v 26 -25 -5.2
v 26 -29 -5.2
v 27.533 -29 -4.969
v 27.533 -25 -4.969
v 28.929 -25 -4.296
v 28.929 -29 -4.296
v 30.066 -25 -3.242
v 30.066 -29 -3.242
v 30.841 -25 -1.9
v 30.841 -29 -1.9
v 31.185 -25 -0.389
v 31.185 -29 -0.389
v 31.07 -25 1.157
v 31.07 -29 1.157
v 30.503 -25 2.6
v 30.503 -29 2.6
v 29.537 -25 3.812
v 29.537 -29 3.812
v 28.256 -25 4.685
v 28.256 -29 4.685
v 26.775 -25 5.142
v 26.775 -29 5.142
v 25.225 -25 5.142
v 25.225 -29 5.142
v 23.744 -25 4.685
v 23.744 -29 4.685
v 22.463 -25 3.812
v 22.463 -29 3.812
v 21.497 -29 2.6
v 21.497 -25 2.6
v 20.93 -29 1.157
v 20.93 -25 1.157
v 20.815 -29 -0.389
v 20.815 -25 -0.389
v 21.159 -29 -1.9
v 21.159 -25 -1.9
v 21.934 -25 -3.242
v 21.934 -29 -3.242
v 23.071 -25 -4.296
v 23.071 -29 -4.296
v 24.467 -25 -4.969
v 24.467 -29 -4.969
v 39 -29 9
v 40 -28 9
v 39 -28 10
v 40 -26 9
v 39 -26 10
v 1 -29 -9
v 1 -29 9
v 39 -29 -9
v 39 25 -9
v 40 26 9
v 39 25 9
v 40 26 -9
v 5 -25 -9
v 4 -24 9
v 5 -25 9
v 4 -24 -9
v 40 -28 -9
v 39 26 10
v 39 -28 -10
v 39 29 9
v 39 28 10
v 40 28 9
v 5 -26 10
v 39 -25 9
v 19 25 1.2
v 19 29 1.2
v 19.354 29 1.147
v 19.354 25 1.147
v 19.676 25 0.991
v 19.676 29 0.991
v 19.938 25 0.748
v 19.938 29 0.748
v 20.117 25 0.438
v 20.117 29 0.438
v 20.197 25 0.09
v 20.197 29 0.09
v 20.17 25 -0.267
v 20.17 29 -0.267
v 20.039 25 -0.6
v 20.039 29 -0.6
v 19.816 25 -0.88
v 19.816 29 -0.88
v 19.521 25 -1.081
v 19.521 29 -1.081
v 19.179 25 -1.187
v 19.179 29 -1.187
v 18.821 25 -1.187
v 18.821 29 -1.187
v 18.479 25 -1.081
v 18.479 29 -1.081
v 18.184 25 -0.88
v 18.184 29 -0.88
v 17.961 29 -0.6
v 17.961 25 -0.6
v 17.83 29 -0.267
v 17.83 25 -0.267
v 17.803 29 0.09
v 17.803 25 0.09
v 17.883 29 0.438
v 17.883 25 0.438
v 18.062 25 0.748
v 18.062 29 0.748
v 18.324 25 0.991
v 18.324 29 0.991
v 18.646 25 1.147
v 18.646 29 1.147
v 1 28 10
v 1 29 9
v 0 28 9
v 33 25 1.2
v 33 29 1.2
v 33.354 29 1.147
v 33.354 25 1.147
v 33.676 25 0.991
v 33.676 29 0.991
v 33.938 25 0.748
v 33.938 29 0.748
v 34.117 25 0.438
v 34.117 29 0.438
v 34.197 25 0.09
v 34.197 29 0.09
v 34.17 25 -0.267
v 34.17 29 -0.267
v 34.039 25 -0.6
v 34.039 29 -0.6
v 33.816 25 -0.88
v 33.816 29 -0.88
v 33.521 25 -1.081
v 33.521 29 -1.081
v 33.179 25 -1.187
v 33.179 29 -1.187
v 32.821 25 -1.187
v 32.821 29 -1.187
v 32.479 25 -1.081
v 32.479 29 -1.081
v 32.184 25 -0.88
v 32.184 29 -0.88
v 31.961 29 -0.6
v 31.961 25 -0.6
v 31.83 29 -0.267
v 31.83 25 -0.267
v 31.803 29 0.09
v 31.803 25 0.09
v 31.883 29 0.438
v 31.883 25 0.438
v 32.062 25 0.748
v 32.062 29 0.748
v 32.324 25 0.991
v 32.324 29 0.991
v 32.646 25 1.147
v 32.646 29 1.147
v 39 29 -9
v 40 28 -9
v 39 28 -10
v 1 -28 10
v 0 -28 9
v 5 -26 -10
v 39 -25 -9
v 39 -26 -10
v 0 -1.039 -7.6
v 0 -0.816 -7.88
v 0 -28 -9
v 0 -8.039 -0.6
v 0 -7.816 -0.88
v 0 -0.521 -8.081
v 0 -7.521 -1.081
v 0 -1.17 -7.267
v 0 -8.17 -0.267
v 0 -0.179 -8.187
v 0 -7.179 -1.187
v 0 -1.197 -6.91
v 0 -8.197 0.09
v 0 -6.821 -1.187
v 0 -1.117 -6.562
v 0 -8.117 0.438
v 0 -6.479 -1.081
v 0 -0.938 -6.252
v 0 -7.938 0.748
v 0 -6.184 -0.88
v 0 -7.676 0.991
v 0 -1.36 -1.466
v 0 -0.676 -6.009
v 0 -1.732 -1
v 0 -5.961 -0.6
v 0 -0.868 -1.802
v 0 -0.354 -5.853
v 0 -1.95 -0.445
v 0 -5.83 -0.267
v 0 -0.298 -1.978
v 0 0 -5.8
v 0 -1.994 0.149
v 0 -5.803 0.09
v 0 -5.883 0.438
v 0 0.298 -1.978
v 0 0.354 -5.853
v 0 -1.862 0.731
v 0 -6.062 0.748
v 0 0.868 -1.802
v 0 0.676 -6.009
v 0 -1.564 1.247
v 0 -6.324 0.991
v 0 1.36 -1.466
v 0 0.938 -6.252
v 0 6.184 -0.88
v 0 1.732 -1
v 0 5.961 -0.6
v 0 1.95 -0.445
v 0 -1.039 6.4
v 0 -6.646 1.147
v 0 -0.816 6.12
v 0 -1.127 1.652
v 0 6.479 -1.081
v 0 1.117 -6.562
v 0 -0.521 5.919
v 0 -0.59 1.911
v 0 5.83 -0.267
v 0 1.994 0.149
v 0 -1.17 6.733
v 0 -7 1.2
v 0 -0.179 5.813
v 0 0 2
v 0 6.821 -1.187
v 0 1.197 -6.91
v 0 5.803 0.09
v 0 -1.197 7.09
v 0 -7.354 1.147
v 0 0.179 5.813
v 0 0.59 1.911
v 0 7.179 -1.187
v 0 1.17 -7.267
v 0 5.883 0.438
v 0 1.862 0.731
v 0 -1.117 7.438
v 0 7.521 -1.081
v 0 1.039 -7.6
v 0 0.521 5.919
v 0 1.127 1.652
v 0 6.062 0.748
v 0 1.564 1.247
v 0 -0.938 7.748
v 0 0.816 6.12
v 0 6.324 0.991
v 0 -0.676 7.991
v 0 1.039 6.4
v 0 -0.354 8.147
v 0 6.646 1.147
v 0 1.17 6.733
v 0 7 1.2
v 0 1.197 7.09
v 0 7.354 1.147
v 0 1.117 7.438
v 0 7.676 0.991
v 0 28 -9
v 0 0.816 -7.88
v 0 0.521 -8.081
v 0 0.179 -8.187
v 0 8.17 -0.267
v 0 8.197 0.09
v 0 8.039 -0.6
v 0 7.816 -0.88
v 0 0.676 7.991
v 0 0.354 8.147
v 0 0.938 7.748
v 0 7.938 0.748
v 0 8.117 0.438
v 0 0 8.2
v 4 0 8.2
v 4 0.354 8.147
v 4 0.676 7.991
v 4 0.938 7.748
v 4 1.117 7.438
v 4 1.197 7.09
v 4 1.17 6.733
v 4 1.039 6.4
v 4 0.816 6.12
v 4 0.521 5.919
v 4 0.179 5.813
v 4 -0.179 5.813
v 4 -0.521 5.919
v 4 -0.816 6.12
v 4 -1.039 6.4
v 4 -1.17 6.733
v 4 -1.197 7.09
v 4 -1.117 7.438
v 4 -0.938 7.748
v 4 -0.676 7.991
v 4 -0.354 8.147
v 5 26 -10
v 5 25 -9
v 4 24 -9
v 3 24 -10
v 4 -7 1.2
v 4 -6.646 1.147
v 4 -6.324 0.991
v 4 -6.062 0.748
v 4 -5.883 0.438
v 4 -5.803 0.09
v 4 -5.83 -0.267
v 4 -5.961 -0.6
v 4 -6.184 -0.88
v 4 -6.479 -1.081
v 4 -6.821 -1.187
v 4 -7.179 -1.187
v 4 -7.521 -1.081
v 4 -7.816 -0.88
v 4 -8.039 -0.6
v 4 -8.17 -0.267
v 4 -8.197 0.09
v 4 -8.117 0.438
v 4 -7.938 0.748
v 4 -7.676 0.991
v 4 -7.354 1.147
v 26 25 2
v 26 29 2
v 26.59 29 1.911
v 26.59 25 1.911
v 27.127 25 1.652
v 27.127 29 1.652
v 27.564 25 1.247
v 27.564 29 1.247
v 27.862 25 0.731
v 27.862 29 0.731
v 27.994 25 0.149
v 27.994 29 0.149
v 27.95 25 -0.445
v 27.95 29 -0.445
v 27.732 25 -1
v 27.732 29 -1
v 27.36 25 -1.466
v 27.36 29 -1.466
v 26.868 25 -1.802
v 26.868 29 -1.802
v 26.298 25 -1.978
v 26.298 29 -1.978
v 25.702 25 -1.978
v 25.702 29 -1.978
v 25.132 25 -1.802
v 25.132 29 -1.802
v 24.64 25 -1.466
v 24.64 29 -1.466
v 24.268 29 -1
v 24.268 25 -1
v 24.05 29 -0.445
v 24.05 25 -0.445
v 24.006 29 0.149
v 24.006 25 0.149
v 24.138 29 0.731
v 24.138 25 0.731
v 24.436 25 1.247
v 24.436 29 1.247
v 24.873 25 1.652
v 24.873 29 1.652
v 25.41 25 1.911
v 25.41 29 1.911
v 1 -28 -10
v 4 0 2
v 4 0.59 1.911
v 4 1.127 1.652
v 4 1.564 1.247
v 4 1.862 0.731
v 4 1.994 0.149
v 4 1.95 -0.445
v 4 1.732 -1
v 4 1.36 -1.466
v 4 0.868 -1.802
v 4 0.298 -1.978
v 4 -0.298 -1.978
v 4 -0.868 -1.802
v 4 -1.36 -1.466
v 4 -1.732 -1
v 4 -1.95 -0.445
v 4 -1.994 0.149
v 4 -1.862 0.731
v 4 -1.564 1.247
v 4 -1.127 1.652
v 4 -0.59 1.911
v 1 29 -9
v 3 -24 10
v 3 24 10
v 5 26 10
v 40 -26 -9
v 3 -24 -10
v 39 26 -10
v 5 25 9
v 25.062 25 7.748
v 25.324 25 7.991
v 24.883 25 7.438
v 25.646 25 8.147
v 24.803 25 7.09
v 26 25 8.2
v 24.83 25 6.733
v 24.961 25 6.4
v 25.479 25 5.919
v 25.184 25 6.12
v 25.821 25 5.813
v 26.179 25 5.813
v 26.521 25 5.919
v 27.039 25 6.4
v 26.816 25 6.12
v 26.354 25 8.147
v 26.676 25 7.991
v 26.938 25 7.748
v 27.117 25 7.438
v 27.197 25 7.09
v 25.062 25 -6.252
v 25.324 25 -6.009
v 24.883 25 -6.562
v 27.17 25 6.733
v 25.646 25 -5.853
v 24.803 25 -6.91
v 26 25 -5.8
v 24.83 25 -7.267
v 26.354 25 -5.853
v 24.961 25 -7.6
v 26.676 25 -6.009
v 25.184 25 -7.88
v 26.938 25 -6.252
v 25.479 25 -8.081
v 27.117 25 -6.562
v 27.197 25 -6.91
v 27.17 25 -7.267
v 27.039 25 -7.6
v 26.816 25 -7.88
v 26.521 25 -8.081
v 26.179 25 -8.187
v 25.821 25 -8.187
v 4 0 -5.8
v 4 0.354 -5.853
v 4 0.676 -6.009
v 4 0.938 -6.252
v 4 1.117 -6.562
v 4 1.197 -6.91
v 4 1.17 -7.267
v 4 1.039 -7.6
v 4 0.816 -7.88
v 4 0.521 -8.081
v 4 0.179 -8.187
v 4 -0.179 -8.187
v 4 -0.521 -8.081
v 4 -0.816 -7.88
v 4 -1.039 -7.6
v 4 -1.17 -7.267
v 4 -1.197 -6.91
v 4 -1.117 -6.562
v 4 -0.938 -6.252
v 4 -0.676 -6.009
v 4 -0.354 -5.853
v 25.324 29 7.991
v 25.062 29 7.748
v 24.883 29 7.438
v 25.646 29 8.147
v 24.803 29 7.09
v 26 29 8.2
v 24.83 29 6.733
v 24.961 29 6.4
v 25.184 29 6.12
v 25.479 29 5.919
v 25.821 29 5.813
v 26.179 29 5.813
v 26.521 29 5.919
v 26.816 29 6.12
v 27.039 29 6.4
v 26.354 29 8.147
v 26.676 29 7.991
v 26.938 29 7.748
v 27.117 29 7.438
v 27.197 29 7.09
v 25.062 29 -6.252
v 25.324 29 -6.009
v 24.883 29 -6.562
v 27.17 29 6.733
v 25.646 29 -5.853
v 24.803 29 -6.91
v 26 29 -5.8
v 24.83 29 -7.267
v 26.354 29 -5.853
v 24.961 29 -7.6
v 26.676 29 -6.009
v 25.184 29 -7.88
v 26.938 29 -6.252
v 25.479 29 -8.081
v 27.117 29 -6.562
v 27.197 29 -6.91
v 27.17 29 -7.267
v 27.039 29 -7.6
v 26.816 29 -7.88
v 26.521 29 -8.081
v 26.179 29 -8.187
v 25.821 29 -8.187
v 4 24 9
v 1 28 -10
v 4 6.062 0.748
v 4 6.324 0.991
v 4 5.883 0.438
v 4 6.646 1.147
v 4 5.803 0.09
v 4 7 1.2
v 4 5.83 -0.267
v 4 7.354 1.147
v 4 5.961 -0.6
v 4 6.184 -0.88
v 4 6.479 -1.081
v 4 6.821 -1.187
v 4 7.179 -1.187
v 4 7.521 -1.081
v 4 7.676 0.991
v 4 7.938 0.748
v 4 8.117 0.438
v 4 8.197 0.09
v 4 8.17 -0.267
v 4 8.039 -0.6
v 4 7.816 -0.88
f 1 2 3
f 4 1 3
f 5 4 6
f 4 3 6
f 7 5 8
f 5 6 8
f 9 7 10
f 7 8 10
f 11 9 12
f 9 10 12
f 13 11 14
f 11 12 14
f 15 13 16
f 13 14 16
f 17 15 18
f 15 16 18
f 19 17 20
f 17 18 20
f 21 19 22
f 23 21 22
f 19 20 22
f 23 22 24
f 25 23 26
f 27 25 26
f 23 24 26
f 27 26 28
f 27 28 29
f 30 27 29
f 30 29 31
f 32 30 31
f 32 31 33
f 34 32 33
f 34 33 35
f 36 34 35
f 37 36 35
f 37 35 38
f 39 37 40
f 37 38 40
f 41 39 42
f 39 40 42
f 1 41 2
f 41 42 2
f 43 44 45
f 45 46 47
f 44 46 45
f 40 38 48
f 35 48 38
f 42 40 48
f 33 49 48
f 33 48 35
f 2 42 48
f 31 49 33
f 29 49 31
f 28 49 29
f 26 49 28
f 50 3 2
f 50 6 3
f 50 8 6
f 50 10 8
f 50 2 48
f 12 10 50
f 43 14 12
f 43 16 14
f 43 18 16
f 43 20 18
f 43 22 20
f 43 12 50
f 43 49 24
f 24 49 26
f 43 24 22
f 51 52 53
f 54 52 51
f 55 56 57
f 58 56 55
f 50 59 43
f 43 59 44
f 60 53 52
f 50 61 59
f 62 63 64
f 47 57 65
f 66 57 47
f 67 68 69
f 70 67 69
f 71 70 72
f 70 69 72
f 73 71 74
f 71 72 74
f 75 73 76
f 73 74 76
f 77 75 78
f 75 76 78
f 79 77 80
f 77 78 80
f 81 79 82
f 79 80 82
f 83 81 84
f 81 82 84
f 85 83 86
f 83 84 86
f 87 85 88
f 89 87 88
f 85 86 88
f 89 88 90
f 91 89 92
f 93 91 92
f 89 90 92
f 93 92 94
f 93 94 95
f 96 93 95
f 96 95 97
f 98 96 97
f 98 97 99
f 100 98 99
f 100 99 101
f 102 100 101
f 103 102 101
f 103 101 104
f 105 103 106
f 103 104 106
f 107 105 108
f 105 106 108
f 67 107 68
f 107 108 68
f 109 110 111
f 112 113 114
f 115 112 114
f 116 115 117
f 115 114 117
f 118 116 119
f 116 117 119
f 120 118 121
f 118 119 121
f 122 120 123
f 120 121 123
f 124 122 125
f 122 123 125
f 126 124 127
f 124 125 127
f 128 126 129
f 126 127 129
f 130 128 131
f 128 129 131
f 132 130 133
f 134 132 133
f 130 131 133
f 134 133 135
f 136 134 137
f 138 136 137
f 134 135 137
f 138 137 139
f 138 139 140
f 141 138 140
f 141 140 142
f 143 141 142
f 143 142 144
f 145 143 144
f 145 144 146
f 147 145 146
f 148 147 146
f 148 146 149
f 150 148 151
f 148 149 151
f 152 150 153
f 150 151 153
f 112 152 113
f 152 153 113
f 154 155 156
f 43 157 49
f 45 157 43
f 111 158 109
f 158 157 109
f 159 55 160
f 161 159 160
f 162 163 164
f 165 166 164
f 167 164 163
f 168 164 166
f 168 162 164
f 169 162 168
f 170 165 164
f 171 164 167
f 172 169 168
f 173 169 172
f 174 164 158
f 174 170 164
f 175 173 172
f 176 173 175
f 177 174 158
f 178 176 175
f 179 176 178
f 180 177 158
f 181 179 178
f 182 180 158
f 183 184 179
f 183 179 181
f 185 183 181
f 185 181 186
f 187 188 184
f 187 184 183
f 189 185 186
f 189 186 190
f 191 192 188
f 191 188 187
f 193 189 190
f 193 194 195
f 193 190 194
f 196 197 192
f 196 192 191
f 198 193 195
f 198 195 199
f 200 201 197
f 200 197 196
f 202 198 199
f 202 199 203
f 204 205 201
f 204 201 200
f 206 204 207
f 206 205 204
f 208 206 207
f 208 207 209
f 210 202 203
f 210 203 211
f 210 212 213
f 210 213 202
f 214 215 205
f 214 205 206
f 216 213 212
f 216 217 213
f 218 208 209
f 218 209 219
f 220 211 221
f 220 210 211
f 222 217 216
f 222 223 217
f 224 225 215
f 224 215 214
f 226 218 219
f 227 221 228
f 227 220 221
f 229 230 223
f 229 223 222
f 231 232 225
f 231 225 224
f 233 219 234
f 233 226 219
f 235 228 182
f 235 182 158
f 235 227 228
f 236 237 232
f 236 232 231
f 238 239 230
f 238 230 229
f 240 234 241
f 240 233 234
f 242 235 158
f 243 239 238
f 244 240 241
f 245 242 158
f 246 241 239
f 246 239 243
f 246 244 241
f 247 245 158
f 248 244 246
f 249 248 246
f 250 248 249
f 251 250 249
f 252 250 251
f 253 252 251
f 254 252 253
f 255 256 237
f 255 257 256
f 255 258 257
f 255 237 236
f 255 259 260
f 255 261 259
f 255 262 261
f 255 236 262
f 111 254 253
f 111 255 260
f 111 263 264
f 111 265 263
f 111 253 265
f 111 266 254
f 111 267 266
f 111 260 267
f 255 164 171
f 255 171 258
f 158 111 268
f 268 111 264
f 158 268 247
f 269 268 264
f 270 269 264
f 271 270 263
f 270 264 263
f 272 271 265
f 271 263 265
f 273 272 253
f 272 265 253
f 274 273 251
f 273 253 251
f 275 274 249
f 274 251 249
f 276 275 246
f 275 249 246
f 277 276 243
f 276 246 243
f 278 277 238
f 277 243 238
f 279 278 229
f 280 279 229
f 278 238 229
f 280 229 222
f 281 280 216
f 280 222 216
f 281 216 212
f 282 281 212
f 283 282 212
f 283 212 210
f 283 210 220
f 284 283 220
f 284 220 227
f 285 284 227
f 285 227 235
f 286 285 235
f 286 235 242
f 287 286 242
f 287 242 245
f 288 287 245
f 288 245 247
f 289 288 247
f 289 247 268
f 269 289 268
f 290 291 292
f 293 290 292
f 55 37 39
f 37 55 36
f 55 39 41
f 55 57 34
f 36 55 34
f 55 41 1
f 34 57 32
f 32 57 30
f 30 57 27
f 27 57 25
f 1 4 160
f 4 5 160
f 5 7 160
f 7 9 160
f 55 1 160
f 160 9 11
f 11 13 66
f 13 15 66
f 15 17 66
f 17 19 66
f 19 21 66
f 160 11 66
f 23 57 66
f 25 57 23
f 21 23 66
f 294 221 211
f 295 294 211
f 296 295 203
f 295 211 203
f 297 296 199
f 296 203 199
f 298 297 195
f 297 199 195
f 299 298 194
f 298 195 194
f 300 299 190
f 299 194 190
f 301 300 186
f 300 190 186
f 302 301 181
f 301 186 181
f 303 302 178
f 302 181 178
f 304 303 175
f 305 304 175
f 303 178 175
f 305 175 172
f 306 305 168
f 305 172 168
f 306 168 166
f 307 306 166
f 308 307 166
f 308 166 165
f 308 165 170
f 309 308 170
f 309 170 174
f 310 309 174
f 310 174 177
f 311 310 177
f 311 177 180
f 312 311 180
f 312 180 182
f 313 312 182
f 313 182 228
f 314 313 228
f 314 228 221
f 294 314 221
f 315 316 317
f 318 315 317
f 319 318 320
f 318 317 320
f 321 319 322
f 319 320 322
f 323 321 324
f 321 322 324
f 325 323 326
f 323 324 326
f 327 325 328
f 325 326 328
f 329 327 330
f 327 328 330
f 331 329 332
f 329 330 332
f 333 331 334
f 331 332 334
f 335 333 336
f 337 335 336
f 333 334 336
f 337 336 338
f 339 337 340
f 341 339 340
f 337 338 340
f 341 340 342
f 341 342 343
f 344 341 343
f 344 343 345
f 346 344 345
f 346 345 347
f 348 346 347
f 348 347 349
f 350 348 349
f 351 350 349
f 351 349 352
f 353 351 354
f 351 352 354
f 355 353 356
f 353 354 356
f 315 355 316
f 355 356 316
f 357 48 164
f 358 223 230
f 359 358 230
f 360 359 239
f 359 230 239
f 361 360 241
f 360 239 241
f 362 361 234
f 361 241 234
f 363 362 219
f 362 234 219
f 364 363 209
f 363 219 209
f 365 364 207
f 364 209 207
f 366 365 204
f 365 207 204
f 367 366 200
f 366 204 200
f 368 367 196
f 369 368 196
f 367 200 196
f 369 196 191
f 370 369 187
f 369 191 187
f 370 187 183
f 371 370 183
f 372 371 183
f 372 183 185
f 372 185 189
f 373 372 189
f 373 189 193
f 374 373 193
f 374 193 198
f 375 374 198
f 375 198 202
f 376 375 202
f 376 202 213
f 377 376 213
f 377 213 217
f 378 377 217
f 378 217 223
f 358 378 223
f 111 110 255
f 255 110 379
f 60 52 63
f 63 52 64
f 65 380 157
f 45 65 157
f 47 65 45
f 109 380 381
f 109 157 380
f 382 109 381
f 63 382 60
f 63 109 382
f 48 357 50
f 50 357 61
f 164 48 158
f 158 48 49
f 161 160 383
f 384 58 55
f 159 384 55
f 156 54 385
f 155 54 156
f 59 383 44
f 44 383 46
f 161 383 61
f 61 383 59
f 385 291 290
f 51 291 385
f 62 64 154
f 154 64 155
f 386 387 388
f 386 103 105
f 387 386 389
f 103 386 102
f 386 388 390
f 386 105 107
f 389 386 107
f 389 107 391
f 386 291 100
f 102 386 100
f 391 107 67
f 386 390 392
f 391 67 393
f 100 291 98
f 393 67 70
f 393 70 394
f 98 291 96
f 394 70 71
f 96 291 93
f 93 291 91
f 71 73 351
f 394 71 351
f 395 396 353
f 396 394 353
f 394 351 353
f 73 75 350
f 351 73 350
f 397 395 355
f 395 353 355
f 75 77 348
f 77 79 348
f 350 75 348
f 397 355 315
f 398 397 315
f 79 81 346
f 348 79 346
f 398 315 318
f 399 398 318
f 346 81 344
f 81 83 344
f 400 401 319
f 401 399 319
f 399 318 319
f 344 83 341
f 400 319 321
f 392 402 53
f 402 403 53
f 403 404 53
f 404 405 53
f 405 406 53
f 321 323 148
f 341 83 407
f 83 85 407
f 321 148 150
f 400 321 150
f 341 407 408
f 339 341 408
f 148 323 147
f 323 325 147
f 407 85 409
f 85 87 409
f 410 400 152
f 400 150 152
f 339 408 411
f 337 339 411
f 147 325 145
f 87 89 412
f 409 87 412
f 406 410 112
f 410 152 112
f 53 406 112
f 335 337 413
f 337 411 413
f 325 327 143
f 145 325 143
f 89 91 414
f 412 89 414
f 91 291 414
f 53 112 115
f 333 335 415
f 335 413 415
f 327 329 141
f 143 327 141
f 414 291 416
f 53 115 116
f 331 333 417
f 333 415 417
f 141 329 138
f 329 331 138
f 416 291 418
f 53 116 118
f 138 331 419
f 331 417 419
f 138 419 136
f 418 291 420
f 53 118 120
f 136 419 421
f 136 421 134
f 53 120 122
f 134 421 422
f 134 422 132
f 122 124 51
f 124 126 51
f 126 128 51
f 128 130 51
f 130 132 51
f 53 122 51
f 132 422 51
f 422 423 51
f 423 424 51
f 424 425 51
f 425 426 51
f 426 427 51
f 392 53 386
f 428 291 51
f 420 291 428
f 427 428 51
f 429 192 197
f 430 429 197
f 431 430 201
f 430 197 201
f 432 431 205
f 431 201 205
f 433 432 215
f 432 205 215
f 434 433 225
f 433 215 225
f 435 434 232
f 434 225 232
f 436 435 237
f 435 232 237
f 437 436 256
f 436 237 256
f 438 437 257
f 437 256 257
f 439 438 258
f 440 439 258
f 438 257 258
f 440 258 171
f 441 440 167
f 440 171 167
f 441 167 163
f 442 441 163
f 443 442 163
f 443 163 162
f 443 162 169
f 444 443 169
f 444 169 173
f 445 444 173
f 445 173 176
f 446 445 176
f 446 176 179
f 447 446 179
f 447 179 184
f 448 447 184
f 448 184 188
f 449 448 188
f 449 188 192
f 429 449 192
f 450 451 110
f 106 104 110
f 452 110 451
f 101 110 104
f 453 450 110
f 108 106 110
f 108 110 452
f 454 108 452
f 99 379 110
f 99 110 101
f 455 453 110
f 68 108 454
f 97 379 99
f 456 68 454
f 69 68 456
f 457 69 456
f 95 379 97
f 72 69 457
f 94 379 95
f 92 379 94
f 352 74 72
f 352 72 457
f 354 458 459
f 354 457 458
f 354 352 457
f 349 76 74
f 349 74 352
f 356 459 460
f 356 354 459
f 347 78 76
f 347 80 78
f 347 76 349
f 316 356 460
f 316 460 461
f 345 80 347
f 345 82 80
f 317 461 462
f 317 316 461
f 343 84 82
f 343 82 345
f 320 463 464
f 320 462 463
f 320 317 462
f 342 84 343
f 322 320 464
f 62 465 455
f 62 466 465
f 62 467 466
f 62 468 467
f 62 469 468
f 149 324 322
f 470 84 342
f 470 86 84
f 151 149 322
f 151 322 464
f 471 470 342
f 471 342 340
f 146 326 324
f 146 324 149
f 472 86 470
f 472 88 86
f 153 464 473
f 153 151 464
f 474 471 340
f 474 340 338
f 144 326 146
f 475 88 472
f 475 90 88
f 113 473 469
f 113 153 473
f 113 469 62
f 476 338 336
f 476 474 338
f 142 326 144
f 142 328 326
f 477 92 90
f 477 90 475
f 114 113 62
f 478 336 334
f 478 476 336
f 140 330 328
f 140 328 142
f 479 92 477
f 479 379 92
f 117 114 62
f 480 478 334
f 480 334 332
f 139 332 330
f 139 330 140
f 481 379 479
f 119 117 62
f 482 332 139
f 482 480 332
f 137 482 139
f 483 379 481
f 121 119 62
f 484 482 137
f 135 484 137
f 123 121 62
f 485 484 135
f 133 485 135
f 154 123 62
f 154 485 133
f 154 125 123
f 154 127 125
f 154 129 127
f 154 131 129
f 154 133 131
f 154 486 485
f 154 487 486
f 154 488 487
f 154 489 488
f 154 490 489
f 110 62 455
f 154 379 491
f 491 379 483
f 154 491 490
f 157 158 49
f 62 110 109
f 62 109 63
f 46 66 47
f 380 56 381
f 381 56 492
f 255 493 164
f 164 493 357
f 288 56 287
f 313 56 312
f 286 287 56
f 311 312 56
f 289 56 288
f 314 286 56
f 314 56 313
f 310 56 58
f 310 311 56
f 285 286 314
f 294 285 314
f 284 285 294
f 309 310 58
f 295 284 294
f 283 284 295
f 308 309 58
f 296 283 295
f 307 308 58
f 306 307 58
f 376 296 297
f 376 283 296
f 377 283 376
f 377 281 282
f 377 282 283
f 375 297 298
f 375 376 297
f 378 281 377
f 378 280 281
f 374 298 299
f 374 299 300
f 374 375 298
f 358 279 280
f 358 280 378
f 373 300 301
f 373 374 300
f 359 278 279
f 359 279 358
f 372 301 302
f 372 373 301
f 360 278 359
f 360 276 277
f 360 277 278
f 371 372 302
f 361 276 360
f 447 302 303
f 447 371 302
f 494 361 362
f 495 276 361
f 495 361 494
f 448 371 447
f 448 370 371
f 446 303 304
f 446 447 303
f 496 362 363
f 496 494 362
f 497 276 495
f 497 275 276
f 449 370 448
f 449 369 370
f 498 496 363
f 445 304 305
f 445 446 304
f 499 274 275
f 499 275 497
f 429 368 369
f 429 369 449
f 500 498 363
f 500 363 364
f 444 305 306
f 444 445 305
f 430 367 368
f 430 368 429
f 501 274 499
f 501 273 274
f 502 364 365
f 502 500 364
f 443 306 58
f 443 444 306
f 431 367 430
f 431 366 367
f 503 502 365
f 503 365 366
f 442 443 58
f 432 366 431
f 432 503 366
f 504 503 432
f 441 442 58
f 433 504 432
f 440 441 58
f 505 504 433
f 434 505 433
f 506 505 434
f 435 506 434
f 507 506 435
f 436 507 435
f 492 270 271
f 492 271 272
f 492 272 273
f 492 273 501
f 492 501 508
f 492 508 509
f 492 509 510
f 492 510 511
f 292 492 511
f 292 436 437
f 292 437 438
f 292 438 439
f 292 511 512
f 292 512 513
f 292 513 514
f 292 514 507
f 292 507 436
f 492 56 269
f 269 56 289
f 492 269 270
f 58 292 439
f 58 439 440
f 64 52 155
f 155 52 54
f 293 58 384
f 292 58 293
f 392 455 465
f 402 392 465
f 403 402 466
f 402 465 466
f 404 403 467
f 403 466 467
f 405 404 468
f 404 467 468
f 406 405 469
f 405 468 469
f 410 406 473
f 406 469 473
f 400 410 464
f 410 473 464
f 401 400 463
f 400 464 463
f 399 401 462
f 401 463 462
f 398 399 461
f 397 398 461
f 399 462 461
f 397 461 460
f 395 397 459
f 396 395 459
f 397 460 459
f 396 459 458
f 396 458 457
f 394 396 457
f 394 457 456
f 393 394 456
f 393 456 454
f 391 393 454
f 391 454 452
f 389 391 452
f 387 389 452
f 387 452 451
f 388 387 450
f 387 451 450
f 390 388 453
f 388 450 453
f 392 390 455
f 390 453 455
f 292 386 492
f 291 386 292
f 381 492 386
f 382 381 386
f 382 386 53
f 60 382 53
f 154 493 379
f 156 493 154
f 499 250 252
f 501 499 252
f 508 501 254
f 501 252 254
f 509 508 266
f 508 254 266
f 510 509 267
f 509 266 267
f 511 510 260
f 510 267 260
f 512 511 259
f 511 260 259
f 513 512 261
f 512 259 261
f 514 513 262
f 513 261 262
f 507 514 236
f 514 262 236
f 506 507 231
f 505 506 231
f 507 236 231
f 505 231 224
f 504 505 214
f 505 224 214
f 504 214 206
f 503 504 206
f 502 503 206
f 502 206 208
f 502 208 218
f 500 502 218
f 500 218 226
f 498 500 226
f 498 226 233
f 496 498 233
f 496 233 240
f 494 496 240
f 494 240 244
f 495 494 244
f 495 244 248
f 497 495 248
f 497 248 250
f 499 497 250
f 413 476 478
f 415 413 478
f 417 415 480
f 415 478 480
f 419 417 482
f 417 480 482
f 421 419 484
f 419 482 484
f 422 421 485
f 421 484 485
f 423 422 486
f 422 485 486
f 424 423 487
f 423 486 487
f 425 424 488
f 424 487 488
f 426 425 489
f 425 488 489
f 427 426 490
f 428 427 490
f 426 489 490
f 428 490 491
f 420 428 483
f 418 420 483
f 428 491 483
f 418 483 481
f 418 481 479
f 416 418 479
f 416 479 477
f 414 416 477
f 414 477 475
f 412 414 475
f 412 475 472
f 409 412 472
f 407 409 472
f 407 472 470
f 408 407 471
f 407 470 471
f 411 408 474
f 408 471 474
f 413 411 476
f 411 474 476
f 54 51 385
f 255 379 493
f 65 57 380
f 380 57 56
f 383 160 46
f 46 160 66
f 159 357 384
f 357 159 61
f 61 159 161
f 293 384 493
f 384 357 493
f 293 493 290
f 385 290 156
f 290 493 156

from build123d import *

# Parameters (mm, degrees)
SKETCH1_W           = 20
SKETCH1_H           = 50
BOSS_EXTRUDE1_DEPTH = 4
SKETCH2_W           = 40
SKETCH2_H           = 20
BOSS_EXTRUDE2_DEPTH = 4
SKETCH3_R           = 1.2
SKETCH3_R_2         = 2
CUT_EXTRUDE1_DEPTH  = 4
SKETCH4_W           = 40
SKETCH4_H           = 20
BOSS_EXTRUDE3_DEPTH = 4
SKETCH5_R           = 5.2
CUT_EXTRUDE2_DEPTH  = 4
CHAMFER1_SIZE       = 1
SKETCH6_R           = 2
SKETCH6_R_2         = 1.2
CUT_EXTRUDE3_DEPTH  = 10


with BuildPart() as part:
    # Sketch1 → Boss-Extrude1 (new body)
    with BuildSketch(Plane(origin=(0, 0, 0), x_dir=(0, 0, -1), z_dir=(1, 0, 0))):
        Rectangle(SKETCH1_W, SKETCH1_H)
    extrude(amount=BOSS_EXTRUDE1_DEPTH)

    # Sketch2 → Boss-Extrude2 (add)
    with BuildSketch(Plane(origin=(0, 25, 0), x_dir=(1, 0, 0), z_dir=(0, 1, 0))):
        with Locations((20, 0)):
            Rectangle(SKETCH2_W, SKETCH2_H)
    extrude(amount=BOSS_EXTRUDE2_DEPTH)

    # Sketch3 → Cut-Extrude1 (cut)
    with BuildSketch(Plane(origin=(0, 29, 0), x_dir=(1, 0, 0), z_dir=(0, 1, 0))):
        with Locations(Location((33, 0, 0), (0, 0, 270))):
            Circle(SKETCH3_R)
        with Locations(Location((26, 0, 0), (0, 0, 270))):
            Circle(SKETCH3_R_2)
        with Locations(Location((26, -7, 0), (0, 0, 270))):
            Circle(SKETCH3_R)
        with Locations(Location((19, 0, 0), (0, 0, 270))):
            Circle(SKETCH3_R)
        with Locations(Location((26, 7, 0), (0, 0, 270))):
            Circle(SKETCH3_R)
    extrude(amount=-CUT_EXTRUDE1_DEPTH, mode=Mode.SUBTRACT)

    # Sketch4 → Boss-Extrude3 (add)
    with BuildSketch(Plane.XZ.offset(25)):
        with Locations((20, 0)):
            Rectangle(SKETCH4_W, SKETCH4_H)
    extrude(amount=BOSS_EXTRUDE3_DEPTH)

    # Sketch5 → Cut-Extrude2 (cut)
    with BuildSketch(Plane.XZ.offset(29)):
        with Locations(Location((26, 0, 0), (0, 0, 270))):
            Circle(SKETCH5_R)
    extrude(amount=-CUT_EXTRUDE2_DEPTH, mode=Mode.SUBTRACT)

    # Chamfer1
    chamfer1_edges = [part.edges().sort_by_distance(p)[0] for p in [
        (4, 0, 10),
        (4, -25, 0),
        (22, 25, 10),
        (40, 25, 0),
        (40, 27, 10),
        (22, 25, -10),
        (40, 27, -10),
        (0, 29, 0),
        (20, 29, 10),
        (40, 29, 0),
        (20, 29, -10),
        (4, 0, -10),
        (0, 0, 10),
        (22, -25, -10),
        (40, -25, 0),
        (40, -27, -10),
        (22, -25, 10),
        (40, -27, 10),
        (0, -29, 0),
        (20, -29, -10),
        (40, -29, 0),
        (20, -29, 10),
        (0, 0, -10),
        (4, 25, 0),
    ]]
    chamfer(chamfer1_edges, length=CHAMFER1_SIZE)

    # Sketch6 → Cut-Extrude3 (cut)
    with BuildSketch(Plane.ZY):
        Circle(SKETCH6_R)
        with Locations((7, 0)):
            Circle(SKETCH6_R_2)
        with Locations((0, -7)):
            Circle(SKETCH6_R_2)
        with Locations((-7, 0)):
            Circle(SKETCH6_R_2)
        with Locations((0, 7)):
            Circle(SKETCH6_R_2)
    extrude(amount=-CUT_EXTRUDE3_DEPTH, mode=Mode.SUBTRACT)


solid = part.part
